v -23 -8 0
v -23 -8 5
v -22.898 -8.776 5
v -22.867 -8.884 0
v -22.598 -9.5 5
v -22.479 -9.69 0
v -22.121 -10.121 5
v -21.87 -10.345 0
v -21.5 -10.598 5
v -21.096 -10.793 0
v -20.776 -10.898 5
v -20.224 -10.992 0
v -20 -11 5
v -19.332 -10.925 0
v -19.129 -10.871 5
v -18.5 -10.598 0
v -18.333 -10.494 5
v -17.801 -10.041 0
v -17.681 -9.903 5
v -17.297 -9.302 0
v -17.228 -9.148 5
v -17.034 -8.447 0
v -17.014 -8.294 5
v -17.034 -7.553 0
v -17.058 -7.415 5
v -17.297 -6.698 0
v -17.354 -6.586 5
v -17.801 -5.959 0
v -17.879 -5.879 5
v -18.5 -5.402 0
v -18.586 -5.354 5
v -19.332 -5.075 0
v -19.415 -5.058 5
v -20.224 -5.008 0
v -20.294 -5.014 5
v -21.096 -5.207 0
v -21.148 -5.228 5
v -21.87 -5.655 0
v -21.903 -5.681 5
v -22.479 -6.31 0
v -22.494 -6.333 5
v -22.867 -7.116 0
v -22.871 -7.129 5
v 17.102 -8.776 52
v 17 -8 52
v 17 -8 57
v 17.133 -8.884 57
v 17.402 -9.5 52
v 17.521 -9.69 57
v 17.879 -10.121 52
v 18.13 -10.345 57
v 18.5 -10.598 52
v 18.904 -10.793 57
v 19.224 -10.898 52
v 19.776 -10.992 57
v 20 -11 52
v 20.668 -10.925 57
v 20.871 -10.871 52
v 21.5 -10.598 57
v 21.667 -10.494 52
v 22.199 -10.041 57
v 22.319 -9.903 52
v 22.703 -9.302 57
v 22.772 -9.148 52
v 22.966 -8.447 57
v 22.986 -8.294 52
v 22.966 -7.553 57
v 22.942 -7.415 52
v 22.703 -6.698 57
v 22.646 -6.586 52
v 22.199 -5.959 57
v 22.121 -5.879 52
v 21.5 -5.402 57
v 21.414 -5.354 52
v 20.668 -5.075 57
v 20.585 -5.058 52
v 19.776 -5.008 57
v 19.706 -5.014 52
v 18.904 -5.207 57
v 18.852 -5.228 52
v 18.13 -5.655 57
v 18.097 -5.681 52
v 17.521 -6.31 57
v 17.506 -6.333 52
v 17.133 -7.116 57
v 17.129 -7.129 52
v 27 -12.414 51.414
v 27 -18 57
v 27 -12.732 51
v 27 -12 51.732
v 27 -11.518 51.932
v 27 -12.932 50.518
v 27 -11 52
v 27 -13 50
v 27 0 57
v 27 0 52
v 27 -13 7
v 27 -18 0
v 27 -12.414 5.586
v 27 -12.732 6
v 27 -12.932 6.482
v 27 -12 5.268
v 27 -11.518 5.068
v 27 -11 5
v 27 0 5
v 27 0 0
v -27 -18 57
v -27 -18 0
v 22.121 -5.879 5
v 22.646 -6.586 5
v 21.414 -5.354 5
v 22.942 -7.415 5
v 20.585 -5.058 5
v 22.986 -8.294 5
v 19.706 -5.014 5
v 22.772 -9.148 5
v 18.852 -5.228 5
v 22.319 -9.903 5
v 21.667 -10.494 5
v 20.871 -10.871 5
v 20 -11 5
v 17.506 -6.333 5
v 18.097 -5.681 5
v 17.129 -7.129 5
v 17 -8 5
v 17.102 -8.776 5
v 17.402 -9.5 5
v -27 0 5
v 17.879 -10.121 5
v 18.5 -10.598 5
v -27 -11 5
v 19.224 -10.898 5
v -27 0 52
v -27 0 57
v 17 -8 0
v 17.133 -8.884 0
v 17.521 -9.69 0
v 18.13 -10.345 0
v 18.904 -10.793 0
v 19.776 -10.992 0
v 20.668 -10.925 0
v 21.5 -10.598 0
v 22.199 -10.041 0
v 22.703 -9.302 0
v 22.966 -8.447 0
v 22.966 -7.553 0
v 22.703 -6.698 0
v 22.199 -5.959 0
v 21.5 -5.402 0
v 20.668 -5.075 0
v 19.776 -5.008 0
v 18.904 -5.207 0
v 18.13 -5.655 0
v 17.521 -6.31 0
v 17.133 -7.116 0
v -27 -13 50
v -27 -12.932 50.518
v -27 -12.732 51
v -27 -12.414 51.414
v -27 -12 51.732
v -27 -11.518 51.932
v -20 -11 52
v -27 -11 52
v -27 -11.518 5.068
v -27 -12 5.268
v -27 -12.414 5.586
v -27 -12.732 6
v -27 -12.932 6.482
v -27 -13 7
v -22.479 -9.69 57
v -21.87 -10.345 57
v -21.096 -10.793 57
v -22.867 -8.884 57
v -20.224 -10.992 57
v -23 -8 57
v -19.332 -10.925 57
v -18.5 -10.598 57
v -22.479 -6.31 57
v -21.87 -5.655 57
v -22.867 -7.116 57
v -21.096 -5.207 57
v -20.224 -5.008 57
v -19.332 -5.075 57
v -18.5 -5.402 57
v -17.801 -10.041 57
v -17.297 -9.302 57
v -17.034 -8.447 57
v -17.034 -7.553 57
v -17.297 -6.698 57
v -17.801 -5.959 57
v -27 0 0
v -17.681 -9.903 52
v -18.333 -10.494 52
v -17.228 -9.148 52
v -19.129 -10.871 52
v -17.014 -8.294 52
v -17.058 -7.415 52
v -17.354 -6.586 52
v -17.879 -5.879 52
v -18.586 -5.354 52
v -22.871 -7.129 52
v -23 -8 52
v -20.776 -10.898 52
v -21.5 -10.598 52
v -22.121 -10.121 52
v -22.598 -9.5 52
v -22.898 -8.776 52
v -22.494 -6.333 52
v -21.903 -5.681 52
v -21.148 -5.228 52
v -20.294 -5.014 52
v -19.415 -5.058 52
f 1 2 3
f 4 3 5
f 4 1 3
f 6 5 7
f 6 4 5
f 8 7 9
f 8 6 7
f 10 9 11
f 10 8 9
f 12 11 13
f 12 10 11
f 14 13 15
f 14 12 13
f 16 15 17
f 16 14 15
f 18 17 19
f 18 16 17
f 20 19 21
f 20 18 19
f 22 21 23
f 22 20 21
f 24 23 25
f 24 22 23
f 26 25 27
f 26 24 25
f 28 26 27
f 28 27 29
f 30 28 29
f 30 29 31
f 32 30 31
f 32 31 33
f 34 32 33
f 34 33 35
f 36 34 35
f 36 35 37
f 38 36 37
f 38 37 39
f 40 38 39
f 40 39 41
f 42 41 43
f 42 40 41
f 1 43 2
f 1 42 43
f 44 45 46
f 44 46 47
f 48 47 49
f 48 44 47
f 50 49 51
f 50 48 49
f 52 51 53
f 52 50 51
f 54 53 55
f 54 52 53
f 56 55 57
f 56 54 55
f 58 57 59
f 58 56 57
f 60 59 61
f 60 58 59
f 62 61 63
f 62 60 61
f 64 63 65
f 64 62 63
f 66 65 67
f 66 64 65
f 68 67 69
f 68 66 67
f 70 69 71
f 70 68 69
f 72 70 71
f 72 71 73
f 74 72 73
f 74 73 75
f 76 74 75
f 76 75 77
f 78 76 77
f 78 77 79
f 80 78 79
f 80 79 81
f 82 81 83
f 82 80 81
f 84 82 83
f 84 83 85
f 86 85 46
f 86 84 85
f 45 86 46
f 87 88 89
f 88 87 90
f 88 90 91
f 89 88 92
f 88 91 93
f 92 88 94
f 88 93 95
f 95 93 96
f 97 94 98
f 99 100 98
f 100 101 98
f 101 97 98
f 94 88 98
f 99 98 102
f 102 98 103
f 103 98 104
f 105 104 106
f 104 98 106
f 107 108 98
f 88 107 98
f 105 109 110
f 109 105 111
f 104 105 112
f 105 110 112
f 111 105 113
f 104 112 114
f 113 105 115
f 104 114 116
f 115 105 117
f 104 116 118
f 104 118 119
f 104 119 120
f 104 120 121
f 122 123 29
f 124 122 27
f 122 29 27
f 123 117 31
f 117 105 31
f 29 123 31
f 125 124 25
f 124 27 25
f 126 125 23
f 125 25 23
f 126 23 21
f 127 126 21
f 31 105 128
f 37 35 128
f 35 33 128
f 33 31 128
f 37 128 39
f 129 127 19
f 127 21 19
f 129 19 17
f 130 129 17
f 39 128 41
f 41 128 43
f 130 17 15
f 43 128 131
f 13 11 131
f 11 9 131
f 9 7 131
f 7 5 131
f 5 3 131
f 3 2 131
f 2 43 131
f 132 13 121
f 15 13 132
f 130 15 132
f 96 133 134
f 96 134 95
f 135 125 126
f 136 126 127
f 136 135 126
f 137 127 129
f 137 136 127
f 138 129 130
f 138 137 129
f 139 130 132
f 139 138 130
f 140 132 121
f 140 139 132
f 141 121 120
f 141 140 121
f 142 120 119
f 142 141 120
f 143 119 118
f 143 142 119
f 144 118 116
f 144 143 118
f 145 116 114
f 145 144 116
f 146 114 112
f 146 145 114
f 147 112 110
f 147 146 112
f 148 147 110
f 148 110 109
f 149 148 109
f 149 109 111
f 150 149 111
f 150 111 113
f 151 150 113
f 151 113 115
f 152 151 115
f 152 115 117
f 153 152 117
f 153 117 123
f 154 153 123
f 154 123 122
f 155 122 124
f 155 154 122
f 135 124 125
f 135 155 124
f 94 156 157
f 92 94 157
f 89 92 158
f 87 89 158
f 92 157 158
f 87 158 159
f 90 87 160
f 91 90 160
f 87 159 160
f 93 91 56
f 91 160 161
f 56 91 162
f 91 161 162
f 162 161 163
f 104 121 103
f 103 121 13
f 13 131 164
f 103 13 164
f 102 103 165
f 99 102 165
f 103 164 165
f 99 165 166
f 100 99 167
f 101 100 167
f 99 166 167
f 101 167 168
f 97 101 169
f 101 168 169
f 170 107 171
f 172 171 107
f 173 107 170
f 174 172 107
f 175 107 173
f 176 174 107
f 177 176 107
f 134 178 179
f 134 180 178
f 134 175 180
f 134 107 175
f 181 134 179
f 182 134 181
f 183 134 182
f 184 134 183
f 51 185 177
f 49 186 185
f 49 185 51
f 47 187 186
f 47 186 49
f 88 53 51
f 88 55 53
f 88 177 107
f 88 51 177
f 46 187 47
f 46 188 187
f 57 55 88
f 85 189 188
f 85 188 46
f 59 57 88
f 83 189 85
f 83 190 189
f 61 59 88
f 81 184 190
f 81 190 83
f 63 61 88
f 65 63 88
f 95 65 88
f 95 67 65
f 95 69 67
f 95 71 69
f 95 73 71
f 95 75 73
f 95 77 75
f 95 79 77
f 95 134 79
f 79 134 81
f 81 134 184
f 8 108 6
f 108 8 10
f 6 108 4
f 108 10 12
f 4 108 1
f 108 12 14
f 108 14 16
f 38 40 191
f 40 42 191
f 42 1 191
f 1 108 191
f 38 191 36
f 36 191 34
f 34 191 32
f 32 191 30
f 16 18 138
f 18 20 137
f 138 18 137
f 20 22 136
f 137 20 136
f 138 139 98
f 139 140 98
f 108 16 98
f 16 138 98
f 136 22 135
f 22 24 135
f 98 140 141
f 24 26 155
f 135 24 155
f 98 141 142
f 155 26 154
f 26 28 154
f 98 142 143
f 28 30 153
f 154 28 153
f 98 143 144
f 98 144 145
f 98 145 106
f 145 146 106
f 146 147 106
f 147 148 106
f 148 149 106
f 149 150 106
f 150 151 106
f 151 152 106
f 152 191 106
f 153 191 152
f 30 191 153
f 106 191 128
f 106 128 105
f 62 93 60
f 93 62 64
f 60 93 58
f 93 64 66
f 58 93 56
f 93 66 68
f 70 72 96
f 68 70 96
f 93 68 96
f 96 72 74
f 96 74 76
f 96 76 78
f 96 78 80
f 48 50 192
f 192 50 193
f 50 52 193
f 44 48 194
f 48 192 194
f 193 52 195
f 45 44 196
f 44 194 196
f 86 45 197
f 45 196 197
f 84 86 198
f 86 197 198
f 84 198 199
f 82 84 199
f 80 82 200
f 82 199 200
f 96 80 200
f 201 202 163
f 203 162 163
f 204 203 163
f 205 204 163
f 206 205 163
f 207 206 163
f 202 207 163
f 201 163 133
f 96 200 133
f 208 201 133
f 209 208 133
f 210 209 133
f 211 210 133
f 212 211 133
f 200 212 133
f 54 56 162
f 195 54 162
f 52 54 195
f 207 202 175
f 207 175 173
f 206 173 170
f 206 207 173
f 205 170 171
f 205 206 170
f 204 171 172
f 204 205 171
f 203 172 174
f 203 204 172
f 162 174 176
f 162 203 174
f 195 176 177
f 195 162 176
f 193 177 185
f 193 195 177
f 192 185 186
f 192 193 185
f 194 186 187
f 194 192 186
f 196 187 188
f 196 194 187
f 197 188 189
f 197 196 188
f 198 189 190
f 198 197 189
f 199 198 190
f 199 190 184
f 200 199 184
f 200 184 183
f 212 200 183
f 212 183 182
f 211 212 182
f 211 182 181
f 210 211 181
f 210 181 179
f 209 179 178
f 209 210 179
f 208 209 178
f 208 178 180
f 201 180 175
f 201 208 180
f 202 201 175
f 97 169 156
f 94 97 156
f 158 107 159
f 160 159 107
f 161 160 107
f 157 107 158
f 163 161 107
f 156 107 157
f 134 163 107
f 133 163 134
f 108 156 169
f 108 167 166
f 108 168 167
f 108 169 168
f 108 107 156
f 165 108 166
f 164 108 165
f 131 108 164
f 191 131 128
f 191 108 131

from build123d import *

# Parameters (mm, degrees)
ESQUISSE1_W             = 54
ESQUISSE1_H             = 18
ESQUISSE1_R             = 3
BOSS_EXTRU_1_DEPTH      = 57
ENL_V_MAT_EXTRU_1_DEPTH = 57


with BuildPart() as part:
    # Esquisse1 → Boss.-Extru.1 (new body)
    with BuildSketch(Plane.XY):
        with Locations((0, -9)):
            Rectangle(ESQUISSE1_W, ESQUISSE1_H)
        with Locations(Location((-20, -8, 0), (0, 0, 180))):
            Circle(ESQUISSE1_R, mode=Mode.SUBTRACT)
        with Locations(Location((20, -8, 0), (0, 0, 180))):
            Circle(ESQUISSE1_R, mode=Mode.SUBTRACT)
    extrude(amount=BOSS_EXTRU_1_DEPTH)

    # Esquisse3 → Enlèv. mat.-Extru.1 (cut)
    with BuildSketch(Plane.ZY.offset(27)):
        with BuildLine():
            Line((52, 0), (5, 0))
            Line((5, 0), (5, -11))
            ThreePointArc((5, -11), (5.585786438, -12.414213562), (7, -13))
            Line((7, -13), (50, -13))
            ThreePointArc((50, -13), (51.414213562, -12.414213562), (52, -11))
            Line((52, -11), (52, 0))
        make_face()
    extrude(amount=-ENL_V_MAT_EXTRU_1_DEPTH, mode=Mode.SUBTRACT)


solid = part.part
